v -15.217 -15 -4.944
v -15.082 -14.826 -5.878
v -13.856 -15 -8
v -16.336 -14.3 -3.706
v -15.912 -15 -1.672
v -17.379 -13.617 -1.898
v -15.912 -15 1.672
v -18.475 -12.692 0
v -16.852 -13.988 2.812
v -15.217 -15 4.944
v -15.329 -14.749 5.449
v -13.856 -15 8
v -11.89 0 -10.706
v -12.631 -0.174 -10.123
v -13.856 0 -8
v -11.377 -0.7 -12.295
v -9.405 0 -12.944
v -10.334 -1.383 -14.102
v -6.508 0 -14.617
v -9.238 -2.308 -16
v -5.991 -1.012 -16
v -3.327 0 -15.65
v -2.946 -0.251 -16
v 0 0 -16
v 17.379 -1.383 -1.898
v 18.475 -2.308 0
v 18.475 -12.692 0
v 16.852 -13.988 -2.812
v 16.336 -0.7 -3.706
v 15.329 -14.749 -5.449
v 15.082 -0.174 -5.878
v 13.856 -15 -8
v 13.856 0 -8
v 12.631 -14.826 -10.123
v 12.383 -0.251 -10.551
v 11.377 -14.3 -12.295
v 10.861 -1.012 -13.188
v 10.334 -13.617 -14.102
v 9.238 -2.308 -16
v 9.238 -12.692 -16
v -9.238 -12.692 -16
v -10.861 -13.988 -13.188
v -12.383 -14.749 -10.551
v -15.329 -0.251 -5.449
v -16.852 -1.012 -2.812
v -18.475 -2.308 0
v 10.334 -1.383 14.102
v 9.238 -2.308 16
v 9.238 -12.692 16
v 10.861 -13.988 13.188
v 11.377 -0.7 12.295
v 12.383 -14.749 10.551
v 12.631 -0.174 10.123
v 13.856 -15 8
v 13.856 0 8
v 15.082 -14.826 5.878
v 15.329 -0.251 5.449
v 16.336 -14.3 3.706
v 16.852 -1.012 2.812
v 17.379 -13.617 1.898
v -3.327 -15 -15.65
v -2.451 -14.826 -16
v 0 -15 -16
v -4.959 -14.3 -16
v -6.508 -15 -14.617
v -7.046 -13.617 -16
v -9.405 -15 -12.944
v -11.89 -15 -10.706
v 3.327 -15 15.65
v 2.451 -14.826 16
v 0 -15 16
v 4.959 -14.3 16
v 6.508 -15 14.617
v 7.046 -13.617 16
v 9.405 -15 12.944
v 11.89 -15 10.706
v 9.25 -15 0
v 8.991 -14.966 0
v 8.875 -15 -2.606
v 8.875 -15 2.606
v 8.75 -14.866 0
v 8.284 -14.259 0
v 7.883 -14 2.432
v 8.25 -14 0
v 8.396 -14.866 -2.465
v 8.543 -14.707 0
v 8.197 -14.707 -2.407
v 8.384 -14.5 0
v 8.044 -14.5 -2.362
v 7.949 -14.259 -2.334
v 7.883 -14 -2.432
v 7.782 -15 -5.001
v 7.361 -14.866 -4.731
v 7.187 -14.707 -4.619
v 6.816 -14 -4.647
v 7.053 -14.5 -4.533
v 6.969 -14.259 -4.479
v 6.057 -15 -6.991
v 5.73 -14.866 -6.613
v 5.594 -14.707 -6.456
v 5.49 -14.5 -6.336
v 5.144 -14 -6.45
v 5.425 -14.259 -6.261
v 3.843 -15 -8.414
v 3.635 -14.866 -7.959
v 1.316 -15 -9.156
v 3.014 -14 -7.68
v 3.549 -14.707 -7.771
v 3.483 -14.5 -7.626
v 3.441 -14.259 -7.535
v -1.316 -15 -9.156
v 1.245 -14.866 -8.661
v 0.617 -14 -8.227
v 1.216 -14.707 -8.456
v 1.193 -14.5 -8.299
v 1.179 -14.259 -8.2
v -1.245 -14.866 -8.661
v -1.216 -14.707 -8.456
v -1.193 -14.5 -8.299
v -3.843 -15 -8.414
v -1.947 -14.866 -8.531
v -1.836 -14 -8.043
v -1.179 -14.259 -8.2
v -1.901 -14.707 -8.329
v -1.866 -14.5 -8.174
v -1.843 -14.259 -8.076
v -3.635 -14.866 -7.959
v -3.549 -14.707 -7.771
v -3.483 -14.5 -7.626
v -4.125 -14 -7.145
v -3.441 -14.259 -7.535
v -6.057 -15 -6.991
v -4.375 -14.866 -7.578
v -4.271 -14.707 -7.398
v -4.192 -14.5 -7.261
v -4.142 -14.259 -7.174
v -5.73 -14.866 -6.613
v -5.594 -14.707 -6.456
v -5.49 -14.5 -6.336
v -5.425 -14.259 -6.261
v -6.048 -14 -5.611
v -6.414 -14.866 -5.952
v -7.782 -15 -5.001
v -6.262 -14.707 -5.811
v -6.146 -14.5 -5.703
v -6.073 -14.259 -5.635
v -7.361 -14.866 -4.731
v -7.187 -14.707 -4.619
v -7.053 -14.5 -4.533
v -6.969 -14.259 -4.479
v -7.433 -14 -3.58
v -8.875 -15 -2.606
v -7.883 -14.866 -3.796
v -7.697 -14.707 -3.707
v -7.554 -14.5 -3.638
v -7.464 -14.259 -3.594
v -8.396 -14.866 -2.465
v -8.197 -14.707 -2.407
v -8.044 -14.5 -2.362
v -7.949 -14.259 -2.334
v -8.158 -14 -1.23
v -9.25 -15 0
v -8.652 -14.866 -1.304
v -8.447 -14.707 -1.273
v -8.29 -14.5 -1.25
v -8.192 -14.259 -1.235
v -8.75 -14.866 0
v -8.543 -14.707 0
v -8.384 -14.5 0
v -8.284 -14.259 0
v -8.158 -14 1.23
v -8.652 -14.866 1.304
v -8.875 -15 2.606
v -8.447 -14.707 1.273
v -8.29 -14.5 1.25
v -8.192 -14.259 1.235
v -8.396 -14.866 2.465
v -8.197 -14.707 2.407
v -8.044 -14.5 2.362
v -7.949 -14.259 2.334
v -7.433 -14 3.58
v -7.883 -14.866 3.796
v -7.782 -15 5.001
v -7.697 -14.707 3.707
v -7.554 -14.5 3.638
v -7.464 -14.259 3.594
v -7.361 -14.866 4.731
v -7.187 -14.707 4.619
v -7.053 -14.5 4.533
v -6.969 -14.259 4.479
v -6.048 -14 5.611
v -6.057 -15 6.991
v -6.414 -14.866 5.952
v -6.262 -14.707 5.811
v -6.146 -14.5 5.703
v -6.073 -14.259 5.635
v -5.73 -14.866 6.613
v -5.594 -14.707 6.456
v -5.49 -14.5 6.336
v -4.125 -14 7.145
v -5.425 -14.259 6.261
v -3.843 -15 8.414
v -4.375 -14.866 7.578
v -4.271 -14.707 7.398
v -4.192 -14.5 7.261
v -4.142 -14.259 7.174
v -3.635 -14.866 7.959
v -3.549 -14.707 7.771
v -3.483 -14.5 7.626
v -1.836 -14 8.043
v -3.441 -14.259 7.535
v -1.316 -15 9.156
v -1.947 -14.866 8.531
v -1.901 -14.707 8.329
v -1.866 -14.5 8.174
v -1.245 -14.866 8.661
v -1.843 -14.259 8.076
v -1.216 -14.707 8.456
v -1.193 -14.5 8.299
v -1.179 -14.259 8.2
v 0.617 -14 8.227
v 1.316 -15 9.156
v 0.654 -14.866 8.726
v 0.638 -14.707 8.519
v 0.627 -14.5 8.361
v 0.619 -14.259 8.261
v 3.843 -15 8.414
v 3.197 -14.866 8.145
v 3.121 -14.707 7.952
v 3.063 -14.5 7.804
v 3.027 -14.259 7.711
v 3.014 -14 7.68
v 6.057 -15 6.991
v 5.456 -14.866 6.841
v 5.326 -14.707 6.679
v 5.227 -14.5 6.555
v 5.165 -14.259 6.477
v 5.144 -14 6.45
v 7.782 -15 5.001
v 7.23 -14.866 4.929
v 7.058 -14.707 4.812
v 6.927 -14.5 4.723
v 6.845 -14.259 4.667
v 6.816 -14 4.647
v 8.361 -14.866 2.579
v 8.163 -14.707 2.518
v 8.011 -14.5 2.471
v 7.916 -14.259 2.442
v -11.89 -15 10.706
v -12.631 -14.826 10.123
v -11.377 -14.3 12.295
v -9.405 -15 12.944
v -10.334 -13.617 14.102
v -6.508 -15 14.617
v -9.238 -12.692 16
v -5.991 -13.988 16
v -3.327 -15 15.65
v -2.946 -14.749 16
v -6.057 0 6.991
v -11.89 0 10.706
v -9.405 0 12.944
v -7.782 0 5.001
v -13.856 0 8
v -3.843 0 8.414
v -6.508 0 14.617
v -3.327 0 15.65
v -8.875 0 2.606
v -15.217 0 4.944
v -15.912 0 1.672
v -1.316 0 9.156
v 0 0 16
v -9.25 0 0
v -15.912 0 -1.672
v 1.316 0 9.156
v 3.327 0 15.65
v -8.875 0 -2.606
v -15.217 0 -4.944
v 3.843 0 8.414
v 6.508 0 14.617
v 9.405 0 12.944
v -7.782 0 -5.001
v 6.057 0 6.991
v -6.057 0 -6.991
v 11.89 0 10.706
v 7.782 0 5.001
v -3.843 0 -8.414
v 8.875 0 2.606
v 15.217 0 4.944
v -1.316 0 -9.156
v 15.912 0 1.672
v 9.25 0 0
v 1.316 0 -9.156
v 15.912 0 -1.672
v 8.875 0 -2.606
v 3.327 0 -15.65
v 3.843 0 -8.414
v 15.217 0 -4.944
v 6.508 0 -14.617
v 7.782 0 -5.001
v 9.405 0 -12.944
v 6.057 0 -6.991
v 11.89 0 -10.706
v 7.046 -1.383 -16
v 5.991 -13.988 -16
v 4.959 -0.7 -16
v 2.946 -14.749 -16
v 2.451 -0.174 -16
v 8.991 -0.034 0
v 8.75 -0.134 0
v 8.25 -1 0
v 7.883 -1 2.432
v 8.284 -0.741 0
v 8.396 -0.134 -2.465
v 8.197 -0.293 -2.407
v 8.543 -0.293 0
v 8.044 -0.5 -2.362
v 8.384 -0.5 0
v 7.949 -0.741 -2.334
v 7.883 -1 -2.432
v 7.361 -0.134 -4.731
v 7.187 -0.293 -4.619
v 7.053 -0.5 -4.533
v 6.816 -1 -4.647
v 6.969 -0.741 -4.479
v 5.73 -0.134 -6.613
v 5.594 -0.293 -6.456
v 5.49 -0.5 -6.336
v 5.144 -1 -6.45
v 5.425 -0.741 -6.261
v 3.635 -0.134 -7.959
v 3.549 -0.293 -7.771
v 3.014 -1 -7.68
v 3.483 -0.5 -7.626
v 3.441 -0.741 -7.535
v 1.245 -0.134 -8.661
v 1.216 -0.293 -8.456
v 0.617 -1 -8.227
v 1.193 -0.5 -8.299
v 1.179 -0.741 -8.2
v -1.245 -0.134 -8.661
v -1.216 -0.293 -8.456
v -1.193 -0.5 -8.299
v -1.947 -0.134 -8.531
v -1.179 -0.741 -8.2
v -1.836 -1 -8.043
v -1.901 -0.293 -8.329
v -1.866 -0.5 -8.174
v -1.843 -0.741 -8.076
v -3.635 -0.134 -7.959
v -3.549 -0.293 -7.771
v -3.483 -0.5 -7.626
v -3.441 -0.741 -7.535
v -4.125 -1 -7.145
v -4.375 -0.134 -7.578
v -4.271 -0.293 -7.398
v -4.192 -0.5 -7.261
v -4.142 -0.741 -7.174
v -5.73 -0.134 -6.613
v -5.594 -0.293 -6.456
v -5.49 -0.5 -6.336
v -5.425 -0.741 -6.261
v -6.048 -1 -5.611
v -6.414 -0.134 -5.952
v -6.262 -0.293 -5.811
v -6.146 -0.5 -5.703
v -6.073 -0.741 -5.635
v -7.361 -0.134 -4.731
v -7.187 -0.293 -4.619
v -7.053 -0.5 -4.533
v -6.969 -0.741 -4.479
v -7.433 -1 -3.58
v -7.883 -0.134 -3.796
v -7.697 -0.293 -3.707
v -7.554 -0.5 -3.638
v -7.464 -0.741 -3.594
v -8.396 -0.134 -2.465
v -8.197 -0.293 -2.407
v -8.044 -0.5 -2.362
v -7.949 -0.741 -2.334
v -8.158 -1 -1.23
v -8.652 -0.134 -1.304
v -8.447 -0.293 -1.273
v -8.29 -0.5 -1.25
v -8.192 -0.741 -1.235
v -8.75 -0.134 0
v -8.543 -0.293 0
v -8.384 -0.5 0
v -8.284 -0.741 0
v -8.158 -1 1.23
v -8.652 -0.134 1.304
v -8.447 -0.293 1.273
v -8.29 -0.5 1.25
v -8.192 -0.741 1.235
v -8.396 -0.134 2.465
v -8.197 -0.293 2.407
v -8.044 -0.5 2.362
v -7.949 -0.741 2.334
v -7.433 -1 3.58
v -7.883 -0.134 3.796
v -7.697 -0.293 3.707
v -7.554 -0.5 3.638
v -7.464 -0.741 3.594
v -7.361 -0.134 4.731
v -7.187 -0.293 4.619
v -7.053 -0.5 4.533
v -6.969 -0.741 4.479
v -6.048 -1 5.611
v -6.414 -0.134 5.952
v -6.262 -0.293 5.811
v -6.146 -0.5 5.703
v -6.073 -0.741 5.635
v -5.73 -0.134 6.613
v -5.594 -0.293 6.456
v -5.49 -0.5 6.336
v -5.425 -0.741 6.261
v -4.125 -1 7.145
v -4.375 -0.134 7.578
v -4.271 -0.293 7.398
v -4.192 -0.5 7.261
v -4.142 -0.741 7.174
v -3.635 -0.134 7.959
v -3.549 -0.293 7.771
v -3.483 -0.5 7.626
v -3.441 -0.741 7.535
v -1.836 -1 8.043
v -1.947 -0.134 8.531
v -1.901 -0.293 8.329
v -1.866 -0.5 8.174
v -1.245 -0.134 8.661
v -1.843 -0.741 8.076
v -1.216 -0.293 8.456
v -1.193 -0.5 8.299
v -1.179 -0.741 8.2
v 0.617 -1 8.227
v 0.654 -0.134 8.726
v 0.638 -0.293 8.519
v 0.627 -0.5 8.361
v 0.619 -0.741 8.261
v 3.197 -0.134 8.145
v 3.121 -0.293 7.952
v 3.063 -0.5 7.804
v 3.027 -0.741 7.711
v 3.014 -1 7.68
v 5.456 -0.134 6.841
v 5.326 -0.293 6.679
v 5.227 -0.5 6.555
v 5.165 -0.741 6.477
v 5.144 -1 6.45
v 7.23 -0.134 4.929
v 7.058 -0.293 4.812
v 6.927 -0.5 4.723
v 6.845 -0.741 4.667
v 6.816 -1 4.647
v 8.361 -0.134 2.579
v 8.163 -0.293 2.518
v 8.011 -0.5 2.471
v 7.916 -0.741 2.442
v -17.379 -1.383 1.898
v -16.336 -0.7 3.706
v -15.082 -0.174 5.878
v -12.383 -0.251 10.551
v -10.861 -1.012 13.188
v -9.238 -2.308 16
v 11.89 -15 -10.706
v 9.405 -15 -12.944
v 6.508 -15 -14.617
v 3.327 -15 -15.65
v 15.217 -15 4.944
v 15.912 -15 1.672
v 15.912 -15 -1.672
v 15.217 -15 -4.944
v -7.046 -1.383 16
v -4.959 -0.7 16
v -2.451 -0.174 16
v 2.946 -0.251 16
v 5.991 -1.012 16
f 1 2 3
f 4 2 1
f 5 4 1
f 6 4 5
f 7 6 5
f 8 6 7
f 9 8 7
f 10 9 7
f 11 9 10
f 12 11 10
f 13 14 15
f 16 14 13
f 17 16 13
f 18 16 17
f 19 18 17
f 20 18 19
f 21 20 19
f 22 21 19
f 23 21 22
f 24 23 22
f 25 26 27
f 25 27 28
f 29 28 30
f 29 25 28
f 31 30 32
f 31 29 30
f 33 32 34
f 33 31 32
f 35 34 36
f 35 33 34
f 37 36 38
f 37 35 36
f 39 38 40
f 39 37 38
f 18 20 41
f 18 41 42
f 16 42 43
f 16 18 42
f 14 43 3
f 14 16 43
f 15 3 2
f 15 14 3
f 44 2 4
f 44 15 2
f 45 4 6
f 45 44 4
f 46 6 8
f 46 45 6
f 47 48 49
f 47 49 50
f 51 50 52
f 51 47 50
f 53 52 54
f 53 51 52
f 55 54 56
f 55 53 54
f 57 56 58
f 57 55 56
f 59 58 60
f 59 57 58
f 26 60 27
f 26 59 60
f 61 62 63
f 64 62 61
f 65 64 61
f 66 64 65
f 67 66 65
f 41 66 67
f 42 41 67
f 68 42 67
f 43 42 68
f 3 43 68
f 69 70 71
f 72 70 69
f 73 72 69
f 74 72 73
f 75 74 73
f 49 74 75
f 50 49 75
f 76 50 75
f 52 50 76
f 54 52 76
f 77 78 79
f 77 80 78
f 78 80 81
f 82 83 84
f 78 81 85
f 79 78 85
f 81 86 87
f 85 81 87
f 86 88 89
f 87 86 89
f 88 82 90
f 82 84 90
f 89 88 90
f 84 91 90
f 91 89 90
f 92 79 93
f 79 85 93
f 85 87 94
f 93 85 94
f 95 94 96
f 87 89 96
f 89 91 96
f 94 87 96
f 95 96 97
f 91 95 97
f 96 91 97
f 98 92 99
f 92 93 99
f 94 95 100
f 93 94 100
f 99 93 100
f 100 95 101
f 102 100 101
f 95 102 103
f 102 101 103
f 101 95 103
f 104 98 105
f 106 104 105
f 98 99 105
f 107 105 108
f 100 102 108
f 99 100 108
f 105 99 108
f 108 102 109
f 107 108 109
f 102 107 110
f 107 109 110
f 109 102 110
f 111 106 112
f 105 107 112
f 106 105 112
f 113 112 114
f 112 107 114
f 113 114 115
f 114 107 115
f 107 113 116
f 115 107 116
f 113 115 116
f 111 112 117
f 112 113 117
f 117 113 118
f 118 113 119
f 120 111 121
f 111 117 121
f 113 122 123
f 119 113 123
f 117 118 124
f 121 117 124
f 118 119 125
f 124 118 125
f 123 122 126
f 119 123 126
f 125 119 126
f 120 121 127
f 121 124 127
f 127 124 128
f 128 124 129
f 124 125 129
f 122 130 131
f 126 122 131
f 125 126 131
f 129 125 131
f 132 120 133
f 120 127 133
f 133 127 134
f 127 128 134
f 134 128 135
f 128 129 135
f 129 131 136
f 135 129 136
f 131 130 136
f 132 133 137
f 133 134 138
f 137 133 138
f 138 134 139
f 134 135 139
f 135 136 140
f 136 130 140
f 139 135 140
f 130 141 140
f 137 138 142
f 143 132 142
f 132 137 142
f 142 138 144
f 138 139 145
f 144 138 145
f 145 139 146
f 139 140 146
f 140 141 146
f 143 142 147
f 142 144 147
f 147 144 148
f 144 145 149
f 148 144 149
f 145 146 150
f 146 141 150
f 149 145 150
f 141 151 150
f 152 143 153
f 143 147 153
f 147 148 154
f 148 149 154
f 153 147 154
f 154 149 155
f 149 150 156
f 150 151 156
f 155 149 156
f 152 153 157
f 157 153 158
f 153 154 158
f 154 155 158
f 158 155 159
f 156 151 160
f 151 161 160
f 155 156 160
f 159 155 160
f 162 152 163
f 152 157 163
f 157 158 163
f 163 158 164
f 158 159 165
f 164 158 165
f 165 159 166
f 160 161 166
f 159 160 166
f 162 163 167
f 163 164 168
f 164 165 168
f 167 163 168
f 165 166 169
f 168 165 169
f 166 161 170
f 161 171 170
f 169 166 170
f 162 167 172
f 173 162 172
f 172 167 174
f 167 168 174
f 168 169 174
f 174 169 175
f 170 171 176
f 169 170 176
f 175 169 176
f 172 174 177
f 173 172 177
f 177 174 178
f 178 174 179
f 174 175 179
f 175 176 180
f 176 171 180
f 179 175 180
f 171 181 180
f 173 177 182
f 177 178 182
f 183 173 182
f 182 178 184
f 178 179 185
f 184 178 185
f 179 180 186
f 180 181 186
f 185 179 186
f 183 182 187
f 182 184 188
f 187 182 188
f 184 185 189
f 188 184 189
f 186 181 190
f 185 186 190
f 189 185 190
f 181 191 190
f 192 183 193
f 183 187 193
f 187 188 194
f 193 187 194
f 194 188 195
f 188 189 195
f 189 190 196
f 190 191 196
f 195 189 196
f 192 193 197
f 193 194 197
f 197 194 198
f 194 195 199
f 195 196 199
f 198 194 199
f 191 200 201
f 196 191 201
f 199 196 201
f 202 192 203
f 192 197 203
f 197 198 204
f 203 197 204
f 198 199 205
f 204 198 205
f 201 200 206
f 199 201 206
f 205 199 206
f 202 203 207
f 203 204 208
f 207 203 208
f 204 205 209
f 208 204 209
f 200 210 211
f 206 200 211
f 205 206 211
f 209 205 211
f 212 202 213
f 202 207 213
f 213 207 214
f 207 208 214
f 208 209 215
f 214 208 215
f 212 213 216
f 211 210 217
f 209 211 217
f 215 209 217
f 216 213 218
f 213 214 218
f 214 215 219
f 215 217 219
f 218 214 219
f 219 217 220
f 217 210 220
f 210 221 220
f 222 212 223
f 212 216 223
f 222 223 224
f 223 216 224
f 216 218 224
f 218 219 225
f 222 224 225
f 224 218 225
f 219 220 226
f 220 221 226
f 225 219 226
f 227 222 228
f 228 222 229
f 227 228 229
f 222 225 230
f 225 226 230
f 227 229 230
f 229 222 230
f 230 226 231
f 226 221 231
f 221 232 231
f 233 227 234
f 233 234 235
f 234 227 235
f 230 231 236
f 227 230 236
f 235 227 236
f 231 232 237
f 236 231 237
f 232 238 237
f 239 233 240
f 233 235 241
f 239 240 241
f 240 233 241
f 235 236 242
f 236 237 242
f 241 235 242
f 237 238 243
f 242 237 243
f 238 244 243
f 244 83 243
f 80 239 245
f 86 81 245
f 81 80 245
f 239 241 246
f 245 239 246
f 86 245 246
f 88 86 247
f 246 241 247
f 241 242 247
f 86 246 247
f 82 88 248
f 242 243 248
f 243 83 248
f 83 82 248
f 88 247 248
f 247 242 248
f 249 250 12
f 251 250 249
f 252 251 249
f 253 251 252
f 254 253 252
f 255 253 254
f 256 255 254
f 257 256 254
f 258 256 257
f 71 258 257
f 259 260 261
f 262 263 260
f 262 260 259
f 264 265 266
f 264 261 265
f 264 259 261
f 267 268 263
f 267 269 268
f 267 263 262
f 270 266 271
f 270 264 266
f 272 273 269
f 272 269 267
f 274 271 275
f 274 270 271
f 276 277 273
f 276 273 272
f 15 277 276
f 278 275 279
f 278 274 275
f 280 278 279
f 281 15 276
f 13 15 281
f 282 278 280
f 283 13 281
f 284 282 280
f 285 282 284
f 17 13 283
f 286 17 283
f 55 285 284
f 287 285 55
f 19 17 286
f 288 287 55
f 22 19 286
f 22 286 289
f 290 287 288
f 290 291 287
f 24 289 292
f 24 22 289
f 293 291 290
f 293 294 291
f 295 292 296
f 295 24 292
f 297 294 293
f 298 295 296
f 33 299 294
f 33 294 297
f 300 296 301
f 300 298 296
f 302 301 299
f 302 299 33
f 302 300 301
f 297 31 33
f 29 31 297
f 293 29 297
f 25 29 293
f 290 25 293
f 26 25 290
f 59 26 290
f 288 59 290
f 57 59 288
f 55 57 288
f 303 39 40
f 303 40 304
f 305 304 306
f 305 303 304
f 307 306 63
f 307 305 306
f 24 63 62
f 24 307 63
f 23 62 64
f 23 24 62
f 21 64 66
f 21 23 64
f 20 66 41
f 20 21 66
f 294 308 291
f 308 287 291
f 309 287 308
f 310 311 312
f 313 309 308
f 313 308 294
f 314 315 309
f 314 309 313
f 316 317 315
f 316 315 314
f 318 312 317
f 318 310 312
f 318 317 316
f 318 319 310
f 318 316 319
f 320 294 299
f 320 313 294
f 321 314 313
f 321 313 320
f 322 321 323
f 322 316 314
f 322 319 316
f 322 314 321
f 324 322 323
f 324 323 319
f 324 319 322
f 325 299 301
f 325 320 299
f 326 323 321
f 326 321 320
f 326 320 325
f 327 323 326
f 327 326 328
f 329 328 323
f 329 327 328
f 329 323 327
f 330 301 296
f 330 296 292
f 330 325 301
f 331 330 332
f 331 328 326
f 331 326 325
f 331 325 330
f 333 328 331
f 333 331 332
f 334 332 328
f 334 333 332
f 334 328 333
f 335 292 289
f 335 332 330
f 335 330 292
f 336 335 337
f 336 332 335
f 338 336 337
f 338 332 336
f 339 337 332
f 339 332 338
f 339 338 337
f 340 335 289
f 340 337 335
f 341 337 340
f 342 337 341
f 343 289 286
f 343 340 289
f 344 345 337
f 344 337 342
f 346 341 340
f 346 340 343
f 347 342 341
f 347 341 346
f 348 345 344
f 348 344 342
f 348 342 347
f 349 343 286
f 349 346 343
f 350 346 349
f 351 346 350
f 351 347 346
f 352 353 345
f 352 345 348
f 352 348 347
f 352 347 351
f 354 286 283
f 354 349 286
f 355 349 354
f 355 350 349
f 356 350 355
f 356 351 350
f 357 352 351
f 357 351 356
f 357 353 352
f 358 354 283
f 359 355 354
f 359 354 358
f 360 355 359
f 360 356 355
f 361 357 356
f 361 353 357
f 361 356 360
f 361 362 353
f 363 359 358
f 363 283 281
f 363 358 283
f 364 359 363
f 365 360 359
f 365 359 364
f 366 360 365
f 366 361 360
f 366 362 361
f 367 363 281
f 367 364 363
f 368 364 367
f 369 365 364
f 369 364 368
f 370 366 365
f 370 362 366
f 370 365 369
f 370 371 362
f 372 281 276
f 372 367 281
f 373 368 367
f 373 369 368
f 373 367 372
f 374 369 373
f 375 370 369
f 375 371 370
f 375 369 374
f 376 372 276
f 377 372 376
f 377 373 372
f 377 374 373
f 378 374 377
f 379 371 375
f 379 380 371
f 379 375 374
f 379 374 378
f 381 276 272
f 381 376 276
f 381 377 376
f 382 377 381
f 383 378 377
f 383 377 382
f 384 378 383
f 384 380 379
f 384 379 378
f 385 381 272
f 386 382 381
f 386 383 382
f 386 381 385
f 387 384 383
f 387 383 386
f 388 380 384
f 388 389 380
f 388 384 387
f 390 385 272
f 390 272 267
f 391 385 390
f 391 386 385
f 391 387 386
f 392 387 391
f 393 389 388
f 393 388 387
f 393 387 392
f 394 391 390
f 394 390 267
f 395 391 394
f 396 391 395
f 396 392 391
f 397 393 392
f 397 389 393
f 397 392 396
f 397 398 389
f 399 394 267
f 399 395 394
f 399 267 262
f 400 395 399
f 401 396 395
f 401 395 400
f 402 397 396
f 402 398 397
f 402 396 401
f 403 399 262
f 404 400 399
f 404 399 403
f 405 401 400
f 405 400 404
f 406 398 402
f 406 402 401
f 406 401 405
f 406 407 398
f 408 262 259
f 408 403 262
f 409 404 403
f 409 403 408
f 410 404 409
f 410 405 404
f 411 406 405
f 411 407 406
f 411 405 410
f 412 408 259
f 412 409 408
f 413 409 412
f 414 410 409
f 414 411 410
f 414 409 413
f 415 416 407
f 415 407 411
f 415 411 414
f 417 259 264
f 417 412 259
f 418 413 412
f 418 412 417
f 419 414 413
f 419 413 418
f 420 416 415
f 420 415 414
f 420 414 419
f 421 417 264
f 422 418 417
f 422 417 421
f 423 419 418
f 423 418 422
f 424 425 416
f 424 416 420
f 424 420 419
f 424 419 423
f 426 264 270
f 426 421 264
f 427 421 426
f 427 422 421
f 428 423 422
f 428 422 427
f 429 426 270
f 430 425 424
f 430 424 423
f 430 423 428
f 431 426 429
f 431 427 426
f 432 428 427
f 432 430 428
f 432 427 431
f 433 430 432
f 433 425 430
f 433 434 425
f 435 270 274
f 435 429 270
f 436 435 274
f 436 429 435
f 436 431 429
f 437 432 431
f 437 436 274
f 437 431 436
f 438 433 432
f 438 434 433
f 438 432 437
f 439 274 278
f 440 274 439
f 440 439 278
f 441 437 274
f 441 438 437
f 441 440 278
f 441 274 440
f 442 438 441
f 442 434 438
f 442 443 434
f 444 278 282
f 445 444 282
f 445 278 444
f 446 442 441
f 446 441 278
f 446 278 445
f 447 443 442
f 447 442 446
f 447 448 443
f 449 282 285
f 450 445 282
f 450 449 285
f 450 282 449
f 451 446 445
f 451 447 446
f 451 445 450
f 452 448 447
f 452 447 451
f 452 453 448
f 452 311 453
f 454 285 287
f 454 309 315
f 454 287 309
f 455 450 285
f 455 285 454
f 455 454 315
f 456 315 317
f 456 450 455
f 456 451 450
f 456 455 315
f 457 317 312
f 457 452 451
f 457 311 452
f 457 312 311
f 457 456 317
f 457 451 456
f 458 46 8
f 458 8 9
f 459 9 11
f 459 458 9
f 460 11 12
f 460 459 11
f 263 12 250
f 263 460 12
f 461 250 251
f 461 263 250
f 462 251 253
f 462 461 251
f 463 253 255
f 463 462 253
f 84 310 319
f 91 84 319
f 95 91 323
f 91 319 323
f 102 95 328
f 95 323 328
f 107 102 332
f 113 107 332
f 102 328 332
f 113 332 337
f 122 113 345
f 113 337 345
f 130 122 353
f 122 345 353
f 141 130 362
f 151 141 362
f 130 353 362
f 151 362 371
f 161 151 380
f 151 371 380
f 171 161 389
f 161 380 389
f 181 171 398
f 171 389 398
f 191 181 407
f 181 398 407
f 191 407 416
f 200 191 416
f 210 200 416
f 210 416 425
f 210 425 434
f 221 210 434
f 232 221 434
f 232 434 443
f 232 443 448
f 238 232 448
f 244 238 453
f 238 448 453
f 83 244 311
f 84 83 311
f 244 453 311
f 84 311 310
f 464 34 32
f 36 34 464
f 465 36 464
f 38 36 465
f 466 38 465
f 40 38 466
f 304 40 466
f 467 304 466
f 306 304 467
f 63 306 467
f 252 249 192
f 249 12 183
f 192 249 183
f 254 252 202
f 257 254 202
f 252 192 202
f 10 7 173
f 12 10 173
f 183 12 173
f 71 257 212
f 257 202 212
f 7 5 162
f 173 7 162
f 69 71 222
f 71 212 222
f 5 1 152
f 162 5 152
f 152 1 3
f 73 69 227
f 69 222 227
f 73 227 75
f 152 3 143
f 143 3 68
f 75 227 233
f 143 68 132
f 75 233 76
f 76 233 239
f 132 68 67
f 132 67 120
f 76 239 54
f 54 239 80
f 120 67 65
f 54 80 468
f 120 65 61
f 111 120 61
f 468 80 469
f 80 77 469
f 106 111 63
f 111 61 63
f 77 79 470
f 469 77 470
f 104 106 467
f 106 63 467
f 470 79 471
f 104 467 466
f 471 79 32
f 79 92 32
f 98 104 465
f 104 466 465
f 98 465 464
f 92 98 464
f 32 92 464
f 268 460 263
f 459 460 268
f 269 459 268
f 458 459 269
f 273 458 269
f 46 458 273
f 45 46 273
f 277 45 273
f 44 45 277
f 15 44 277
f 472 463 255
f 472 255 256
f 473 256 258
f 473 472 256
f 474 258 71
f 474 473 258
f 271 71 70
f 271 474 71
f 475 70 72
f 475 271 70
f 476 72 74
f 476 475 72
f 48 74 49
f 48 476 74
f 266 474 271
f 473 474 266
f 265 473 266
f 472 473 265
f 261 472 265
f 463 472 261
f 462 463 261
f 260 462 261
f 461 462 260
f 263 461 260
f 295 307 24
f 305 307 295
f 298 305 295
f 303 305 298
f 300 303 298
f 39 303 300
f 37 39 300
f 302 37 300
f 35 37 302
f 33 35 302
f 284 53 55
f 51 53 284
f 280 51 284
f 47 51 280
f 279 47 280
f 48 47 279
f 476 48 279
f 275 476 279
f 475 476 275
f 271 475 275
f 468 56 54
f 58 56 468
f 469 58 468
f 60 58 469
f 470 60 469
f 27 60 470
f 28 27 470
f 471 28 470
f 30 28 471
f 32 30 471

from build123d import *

# Parameters (mm, degrees)
SALIENTE_EXTRUIR1_DEPTH = 15
CROQUIS2_OUTSIDE_W      = 81.348
CROQUIS2_OUTSIDE_H      = 76.398
CROQUIS2_OUTSIDE_R      = 16
CORTAR_EXTRUIR1_DEPTH   = 15
CORTAR_EXTRUIR1_TAPER   = 47
CROQUIS3_OUTSIDE_W      = 81.348
CROQUIS3_OUTSIDE_H      = 76.398
CROQUIS3_OUTSIDE_R      = 16
CORTAR_EXTRUIR2_DEPTH   = 15
CORTAR_EXTRUIR2_TAPER   = 47
CROQUIS4_R              = 8.25
CORTAR_EXTRUIR3_DEPTH   = 15
REDONDEO1_R             = 1


with BuildPart() as part:
    # Croquis1 → Saliente-Extruir1 (new body)
    with BuildSketch(Plane(origin=(0, 0, 0), x_dir=(1, 0, 0), z_dir=(0, 1, 0))):
        Polygon((-9.237604307, -16), (9.237604307, -16), (18.475208614, 0), (9.237604307, 16), (-9.237604307, 16), (-18.475208614, 0), align=None)
    extrude(amount=-SALIENTE_EXTRUIR1_DEPTH)

    # Croquis2 outside → Cortar-Extruir1 (cut)
    with BuildSketch(Plane(origin=(0, 0, 0), x_dir=(1, 0, 0), z_dir=(0, 1, 0))):
        Rectangle(CROQUIS2_OUTSIDE_W, CROQUIS2_OUTSIDE_H)
        Circle(CROQUIS2_OUTSIDE_R, mode=Mode.SUBTRACT)
    extrude(amount=-CORTAR_EXTRUIR1_DEPTH, taper=CORTAR_EXTRUIR1_TAPER, mode=Mode.SUBTRACT)

    # Croquis3 outside → Cortar-Extruir2 (cut)
    with BuildSketch(Plane.XZ.offset(15)):
        Rectangle(CROQUIS3_OUTSIDE_W, CROQUIS3_OUTSIDE_H)
        Circle(CROQUIS3_OUTSIDE_R, mode=Mode.SUBTRACT)
    extrude(amount=-CORTAR_EXTRUIR2_DEPTH, taper=CORTAR_EXTRUIR2_TAPER, mode=Mode.SUBTRACT)

    # Croquis4 → Cortar-Extruir3 (cut)
    with BuildSketch(Plane(origin=(0, 0, 0), x_dir=(1, 0, 0), z_dir=(0, 1, 0))):
        Circle(CROQUIS4_R)
    extrude(amount=-CORTAR_EXTRUIR3_DEPTH, mode=Mode.SUBTRACT)

    # Redondeo1
    redondeo1_edges = [part.edges().sort_by_distance(p)[0] for p in [
        (-8.25, -15, 0),
        (-8.25, 0, 0),
    ]]
    fillet(redondeo1_edges, radius=REDONDEO1_R)


solid = part.part
